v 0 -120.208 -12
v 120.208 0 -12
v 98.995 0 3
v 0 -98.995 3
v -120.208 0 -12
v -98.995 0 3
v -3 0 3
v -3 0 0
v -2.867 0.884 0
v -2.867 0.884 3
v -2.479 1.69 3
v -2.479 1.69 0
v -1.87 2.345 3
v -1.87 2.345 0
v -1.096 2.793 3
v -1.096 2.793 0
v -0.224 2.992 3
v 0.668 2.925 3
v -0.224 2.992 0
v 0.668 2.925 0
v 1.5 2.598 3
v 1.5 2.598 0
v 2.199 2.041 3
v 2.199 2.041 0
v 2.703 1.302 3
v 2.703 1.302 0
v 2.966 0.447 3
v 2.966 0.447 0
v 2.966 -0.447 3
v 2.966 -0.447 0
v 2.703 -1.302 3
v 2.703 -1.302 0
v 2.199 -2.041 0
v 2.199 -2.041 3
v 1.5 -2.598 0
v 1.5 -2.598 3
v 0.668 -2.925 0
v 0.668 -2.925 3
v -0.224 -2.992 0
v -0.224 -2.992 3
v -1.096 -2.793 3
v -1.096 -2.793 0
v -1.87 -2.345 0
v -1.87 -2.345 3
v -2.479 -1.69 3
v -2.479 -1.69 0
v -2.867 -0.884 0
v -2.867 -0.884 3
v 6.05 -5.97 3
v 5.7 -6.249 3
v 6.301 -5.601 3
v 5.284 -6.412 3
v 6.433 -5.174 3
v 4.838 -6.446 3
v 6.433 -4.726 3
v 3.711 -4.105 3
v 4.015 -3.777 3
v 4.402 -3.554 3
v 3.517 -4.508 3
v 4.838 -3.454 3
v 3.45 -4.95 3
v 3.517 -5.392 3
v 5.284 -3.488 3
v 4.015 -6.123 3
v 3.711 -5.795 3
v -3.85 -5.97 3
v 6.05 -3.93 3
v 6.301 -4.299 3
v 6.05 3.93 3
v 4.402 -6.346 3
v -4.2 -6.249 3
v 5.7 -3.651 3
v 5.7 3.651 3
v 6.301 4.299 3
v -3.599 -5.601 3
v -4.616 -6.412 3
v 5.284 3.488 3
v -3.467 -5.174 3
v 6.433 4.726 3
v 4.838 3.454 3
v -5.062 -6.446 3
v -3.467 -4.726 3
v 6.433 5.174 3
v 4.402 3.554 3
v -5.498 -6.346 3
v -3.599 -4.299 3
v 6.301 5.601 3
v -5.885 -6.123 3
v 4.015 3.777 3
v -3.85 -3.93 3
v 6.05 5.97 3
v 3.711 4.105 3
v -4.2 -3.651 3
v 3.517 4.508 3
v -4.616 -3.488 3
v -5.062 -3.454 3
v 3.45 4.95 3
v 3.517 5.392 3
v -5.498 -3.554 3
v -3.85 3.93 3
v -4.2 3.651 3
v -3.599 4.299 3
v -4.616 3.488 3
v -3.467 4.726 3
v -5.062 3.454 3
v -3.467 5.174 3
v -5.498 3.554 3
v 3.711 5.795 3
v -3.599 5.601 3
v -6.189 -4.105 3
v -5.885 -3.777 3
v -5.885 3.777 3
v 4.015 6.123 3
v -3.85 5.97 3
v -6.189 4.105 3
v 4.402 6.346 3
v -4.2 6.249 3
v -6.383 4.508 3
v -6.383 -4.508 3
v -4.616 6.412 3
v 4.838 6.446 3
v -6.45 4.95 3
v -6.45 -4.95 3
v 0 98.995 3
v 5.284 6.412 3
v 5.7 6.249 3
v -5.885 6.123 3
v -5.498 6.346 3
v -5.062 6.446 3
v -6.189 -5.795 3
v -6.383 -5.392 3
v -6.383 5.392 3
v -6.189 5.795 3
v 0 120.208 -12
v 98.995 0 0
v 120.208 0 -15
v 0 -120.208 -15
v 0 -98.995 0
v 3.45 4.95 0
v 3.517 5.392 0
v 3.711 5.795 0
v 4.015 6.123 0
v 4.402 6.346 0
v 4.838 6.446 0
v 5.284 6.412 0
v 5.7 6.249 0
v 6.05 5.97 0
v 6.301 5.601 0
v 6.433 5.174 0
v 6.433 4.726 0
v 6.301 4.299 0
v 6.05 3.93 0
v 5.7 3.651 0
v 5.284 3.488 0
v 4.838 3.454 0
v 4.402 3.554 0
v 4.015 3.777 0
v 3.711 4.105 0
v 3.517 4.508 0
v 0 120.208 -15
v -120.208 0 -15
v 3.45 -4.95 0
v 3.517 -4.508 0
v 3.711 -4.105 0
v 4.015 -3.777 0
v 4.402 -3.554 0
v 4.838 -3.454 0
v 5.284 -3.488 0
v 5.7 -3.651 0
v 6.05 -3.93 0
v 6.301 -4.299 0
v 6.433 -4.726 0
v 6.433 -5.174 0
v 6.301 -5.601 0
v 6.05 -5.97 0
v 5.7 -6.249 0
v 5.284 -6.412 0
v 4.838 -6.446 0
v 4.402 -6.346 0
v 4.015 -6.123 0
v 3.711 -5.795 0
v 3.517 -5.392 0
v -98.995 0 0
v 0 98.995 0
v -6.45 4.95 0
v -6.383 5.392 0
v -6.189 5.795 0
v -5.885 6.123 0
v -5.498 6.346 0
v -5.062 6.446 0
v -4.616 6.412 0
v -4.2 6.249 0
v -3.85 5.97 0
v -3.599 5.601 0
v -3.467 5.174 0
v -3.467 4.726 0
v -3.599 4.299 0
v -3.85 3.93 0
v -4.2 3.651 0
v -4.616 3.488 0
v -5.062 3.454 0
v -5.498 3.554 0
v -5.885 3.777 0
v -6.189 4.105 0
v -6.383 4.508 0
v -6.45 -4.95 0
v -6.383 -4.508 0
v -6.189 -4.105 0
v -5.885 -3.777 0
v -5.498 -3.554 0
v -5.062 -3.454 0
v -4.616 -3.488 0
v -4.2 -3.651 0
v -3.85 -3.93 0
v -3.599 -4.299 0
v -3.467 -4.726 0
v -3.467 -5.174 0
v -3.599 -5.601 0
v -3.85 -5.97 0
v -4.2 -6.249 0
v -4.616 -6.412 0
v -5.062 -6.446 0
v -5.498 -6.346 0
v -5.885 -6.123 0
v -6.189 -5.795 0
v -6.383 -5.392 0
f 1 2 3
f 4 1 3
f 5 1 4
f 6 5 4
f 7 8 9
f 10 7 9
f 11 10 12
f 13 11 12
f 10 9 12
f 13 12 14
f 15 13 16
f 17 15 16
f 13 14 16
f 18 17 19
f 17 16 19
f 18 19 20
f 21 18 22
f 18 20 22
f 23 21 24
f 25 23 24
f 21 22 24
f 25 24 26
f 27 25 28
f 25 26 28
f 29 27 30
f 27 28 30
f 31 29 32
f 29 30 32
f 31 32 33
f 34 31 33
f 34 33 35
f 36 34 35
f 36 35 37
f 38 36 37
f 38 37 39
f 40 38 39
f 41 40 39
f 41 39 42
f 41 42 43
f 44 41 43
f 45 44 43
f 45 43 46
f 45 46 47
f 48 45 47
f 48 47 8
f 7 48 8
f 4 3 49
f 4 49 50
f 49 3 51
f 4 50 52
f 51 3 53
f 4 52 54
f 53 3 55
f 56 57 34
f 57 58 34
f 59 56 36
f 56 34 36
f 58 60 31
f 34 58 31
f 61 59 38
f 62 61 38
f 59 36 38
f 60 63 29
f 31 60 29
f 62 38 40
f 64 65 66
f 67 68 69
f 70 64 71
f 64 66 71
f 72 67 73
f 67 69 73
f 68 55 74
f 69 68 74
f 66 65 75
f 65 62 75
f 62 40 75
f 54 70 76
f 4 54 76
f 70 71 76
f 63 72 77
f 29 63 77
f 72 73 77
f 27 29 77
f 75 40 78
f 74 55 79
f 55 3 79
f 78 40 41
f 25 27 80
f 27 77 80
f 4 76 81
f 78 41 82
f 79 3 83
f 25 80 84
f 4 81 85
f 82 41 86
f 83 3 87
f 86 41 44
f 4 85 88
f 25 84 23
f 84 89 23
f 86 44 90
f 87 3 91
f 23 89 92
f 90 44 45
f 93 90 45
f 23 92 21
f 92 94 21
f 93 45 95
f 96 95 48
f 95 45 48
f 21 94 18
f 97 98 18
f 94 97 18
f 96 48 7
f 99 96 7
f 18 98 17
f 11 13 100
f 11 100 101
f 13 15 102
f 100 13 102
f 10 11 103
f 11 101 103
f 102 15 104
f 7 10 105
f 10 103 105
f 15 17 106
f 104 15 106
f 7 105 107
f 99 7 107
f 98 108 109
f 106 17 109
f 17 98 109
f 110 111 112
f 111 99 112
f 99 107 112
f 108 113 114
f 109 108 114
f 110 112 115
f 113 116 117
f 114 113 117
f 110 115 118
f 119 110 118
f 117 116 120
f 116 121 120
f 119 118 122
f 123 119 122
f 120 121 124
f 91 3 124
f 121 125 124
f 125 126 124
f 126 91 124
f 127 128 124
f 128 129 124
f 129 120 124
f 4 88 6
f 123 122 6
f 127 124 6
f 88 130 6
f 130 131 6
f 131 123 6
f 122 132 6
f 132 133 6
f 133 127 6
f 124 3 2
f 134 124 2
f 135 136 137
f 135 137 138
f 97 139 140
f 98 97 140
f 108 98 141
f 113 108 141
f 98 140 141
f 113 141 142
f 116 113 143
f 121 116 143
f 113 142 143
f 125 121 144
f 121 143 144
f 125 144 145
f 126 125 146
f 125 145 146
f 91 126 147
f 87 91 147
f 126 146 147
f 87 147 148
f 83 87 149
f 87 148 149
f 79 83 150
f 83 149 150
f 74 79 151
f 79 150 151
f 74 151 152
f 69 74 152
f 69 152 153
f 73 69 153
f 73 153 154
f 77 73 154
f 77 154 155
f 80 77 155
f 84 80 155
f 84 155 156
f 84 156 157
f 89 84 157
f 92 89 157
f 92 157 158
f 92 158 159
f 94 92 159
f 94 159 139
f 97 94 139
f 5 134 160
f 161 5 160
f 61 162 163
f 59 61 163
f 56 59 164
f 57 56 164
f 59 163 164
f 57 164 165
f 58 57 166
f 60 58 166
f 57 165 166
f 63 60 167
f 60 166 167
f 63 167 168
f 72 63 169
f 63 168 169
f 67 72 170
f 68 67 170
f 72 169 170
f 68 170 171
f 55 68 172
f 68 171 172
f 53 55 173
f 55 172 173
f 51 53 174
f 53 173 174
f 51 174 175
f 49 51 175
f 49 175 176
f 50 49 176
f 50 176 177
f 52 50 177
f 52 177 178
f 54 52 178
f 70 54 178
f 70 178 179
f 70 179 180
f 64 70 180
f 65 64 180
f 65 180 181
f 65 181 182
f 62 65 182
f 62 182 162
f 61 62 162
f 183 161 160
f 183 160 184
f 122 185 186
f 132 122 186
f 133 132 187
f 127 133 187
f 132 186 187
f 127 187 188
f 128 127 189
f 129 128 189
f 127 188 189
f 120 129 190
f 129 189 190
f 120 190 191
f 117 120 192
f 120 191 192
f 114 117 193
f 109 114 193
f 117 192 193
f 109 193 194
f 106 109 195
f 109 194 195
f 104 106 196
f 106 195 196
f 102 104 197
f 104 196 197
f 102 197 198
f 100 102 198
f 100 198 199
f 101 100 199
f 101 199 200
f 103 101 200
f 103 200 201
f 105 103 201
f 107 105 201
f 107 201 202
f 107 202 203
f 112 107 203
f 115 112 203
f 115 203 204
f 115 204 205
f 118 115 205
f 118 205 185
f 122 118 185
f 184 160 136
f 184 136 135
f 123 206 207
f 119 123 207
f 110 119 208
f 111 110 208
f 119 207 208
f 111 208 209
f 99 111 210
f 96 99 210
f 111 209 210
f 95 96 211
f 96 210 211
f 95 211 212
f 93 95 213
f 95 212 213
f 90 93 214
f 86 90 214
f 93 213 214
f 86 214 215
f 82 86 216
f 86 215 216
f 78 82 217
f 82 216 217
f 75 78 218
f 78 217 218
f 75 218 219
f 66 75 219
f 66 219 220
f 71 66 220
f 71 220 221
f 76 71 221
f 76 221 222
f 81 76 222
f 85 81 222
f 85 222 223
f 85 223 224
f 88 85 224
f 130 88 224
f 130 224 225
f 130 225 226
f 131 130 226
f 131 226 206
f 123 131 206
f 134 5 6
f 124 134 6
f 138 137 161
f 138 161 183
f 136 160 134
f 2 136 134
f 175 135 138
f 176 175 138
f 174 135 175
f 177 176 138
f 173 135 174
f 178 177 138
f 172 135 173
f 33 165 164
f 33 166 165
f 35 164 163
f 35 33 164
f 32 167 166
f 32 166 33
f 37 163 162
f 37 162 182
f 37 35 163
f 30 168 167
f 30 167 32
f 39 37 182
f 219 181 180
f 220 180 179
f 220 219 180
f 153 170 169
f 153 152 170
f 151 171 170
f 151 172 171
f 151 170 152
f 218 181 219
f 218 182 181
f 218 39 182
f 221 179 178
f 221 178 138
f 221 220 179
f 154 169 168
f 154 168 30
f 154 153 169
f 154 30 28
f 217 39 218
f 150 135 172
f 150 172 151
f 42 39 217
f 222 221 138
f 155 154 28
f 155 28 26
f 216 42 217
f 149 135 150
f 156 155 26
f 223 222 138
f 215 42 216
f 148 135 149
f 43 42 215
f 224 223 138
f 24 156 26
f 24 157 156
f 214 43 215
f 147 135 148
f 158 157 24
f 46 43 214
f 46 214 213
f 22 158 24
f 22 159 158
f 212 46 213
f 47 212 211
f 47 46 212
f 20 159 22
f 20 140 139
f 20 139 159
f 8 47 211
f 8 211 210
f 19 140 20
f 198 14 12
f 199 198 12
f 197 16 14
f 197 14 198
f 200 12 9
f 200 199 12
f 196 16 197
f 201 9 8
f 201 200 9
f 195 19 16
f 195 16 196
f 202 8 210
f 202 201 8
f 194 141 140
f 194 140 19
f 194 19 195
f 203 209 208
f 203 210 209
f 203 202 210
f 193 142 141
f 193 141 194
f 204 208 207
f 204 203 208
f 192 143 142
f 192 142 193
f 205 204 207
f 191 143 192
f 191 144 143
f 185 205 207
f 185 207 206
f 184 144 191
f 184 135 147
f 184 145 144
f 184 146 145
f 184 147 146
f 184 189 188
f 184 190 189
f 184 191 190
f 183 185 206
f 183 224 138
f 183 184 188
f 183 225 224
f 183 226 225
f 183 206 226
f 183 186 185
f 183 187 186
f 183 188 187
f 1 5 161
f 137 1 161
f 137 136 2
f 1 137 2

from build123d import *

# Parameters (mm, degrees)
SKETCH_1_W               = 170
SKETCH_1_H               = 170
EXTRUDE_1_DEPTH          = 3
SKETCH_3_R               = 3
SKETCH_3_R_2             = 1.5
CUT_EXTRUDE_1_DEPTH      = 121.245582039
FILLET_1_R               = 2
CUT_EXTRUDE_START        = -10
CUT_EXTRUDE_2_DEPTH      = 10
CUT_EXTRUDE_START_2      = -3
CUT_EXTRUDE_3_DEPTH      = 3
EXTRUDE_4_DEPTH          = 3
EXTRUDE_5_DEPTH          = 170
PATTERN_CIRCULAR_1_COUNT = 4
CUT_EXTRUDE_4_DEPTH      = 179
PATTERN_CIRCULAR_2_COUNT = 4


with BuildPart() as part:
    # 草图1 → 凸台-拉伸1 (new body)
    with BuildSketch(Plane.XY):
        Rectangle(SKETCH_1_W, SKETCH_1_H)
    extrude(amount=EXTRUDE_1_DEPTH)

    # 草图3 → 切除-拉伸1 (cut, through all)
    with BuildSketch(Plane(origin=(0, 0, 0), x_dir=(-1, 0, 0), z_dir=(0, 0, -1))):
        Circle(SKETCH_3_R)
        with Locations((4.95, 4.95)):
            Circle(SKETCH_3_R_2)
        with Locations((-4.95, 4.95)):
            Circle(SKETCH_3_R_2)
        with Locations((-4.95, -4.95)):
            Circle(SKETCH_3_R_2)
        with Locations((4.95, -4.95)):
            Circle(SKETCH_3_R_2)
    extrude(amount=-CUT_EXTRUDE_1_DEPTH, mode=Mode.SUBTRACT)

    # 圆角1
    fillet_1_edges = [part.edges().sort_by_distance(p)[0] for p in [
        (-85, 85, 1.5),
        (85, 85, 1.5),
        (85, -85, 1.5),
        (-85, -85, 1.5),
    ]]
    fillet(fillet_1_edges, radius=FILLET_1_R)

    # 草图4 → 切除-拉伸2 (cut)
    with BuildSketch(Plane(origin=(0, 0, 0), x_dir=(-1, 0, 0), z_dir=(0, 0, -1)).offset(CUT_EXTRUDE_START)):
        with BuildLine():
            Line((-85, 35.208152802), (-60.104076401, 60.104076401))
            Line((-60.104076401, 60.104076401), (-35.208152802, 85))
            Line((-35.208152802, 85), (-83, 85))
            ThreePointArc((-83, 85), (-84.414213562, 84.414213562), (-85, 83))
            Line((-85, 83), (-85, 35.208152802))
        make_face()
        with BuildLine():
            Line((85, -35.208152802), (60.104076401, -60.104076401))
            Line((60.104076401, -60.104076401), (35.208152802, -85))
            Line((35.208152802, -85), (83, -85))
            ThreePointArc((83, -85), (84.414213562, -84.414213562), (85, -83))
            Line((85, -83), (85, -35.208152802))
        make_face()
    extrude(amount=CUT_EXTRUDE_2_DEPTH, mode=Mode.SUBTRACT)

    # 草图6 → 切除-拉伸3 (cut)
    with BuildSketch(Plane(origin=(0, 0, 0), x_dir=(-1, 0, 0), z_dir=(0, 0, -1)).offset(CUT_EXTRUDE_START_2)):
        with BuildLine():
            Line((-35.208152802, -85), (-60.104076401, -60.104076401))
            Line((-60.104076401, -60.104076401), (-85, -35.208152802))
            Line((-85, -35.208152802), (-85, -83))
            ThreePointArc((-85, -83), (-84.414213562, -84.414213562), (-83, -85))
            Line((-83, -85), (-35.208152802, -85))
        make_face()
        with BuildLine():
            Line((35.208152802, 85), (60.104076401, 60.104076401))
            Line((60.104076401, 60.104076401), (85, 35.208152802))
            Line((85, 35.208152802), (85, 83))
            ThreePointArc((85, 83), (84.414213562, 84.414213562), (83, 85))
            Line((83, 85), (35.208152802, 85))
        make_face()
    extrude(amount=CUT_EXTRUDE_3_DEPTH, mode=Mode.SUBTRACT)

    # 草图7 → 凸台-拉伸4 (add)
    with BuildSketch(Plane(origin=(0, 0, 0), x_dir=(-1, 0, 0), z_dir=(0, 0, -1))):
        Polygon((-85, 35.208152802), (-120.208152802, 0), (-85, -35.208152802), align=None)
        Polygon((0, 120.208152802), (-35.208152802, 85), (35.208152802, 85), align=None)
        Polygon((35.208152802, -85), (-35.208152802, -85), (0, -120.208152802), align=None)
        Polygon((120.208152802, 0), (85, 35.208152802), (85, -35.208152802), align=None)
    extrude(amount=-EXTRUDE_4_DEPTH)

    # 草图8 → 凸台-拉伸5 (add)
    with BuildSketch(Plane(origin=(-60.104076401, 60.104076401, 0), x_dir=(0, 0, 1), z_dir=(-0.7071067811865438, 0.7071067811865513, 0))):
        Polygon((0, 73), (-12, 85), (-15, 85), (0, 70), align=None)
    extrude_5 = extrude(amount=-EXTRUDE_5_DEPTH)

    # 阵列(圆周)1: 凸台-拉伸5 ×4 about axis
    pattern_circular_1_axis = Axis((0, 0, 0), (0, 0, 1))
    for i in range(1, PATTERN_CIRCULAR_1_COUNT):
        add(extrude_5.rotate(pattern_circular_1_axis, i * 360 / PATTERN_CIRCULAR_1_COUNT))

    # 草图9 → 切除-拉伸4 (cut)
    with BuildSketch(Plane(origin=(60.104076401, 60.104076401, 0), x_dir=(0, 0, -1), z_dir=(0.7071067811865486, 0.7071067811865465, 0))):
        Polygon((-3, 85), (12, 85), (-3, 70), align=None)
    cut_extrude_4 = extrude(amount=-CUT_EXTRUDE_4_DEPTH, mode=Mode.SUBTRACT)

    # 阵列(圆周)2: 切除-拉伸4 ×4 about axis
    pattern_circular_2_axis = Axis((0, 0, 0), (0, 0, -1))
    for i in range(1, PATTERN_CIRCULAR_2_COUNT):
        add(cut_extrude_4.rotate(pattern_circular_2_axis, i * 360 / PATTERN_CIRCULAR_2_COUNT), mode=Mode.SUBTRACT)


solid = part.part
